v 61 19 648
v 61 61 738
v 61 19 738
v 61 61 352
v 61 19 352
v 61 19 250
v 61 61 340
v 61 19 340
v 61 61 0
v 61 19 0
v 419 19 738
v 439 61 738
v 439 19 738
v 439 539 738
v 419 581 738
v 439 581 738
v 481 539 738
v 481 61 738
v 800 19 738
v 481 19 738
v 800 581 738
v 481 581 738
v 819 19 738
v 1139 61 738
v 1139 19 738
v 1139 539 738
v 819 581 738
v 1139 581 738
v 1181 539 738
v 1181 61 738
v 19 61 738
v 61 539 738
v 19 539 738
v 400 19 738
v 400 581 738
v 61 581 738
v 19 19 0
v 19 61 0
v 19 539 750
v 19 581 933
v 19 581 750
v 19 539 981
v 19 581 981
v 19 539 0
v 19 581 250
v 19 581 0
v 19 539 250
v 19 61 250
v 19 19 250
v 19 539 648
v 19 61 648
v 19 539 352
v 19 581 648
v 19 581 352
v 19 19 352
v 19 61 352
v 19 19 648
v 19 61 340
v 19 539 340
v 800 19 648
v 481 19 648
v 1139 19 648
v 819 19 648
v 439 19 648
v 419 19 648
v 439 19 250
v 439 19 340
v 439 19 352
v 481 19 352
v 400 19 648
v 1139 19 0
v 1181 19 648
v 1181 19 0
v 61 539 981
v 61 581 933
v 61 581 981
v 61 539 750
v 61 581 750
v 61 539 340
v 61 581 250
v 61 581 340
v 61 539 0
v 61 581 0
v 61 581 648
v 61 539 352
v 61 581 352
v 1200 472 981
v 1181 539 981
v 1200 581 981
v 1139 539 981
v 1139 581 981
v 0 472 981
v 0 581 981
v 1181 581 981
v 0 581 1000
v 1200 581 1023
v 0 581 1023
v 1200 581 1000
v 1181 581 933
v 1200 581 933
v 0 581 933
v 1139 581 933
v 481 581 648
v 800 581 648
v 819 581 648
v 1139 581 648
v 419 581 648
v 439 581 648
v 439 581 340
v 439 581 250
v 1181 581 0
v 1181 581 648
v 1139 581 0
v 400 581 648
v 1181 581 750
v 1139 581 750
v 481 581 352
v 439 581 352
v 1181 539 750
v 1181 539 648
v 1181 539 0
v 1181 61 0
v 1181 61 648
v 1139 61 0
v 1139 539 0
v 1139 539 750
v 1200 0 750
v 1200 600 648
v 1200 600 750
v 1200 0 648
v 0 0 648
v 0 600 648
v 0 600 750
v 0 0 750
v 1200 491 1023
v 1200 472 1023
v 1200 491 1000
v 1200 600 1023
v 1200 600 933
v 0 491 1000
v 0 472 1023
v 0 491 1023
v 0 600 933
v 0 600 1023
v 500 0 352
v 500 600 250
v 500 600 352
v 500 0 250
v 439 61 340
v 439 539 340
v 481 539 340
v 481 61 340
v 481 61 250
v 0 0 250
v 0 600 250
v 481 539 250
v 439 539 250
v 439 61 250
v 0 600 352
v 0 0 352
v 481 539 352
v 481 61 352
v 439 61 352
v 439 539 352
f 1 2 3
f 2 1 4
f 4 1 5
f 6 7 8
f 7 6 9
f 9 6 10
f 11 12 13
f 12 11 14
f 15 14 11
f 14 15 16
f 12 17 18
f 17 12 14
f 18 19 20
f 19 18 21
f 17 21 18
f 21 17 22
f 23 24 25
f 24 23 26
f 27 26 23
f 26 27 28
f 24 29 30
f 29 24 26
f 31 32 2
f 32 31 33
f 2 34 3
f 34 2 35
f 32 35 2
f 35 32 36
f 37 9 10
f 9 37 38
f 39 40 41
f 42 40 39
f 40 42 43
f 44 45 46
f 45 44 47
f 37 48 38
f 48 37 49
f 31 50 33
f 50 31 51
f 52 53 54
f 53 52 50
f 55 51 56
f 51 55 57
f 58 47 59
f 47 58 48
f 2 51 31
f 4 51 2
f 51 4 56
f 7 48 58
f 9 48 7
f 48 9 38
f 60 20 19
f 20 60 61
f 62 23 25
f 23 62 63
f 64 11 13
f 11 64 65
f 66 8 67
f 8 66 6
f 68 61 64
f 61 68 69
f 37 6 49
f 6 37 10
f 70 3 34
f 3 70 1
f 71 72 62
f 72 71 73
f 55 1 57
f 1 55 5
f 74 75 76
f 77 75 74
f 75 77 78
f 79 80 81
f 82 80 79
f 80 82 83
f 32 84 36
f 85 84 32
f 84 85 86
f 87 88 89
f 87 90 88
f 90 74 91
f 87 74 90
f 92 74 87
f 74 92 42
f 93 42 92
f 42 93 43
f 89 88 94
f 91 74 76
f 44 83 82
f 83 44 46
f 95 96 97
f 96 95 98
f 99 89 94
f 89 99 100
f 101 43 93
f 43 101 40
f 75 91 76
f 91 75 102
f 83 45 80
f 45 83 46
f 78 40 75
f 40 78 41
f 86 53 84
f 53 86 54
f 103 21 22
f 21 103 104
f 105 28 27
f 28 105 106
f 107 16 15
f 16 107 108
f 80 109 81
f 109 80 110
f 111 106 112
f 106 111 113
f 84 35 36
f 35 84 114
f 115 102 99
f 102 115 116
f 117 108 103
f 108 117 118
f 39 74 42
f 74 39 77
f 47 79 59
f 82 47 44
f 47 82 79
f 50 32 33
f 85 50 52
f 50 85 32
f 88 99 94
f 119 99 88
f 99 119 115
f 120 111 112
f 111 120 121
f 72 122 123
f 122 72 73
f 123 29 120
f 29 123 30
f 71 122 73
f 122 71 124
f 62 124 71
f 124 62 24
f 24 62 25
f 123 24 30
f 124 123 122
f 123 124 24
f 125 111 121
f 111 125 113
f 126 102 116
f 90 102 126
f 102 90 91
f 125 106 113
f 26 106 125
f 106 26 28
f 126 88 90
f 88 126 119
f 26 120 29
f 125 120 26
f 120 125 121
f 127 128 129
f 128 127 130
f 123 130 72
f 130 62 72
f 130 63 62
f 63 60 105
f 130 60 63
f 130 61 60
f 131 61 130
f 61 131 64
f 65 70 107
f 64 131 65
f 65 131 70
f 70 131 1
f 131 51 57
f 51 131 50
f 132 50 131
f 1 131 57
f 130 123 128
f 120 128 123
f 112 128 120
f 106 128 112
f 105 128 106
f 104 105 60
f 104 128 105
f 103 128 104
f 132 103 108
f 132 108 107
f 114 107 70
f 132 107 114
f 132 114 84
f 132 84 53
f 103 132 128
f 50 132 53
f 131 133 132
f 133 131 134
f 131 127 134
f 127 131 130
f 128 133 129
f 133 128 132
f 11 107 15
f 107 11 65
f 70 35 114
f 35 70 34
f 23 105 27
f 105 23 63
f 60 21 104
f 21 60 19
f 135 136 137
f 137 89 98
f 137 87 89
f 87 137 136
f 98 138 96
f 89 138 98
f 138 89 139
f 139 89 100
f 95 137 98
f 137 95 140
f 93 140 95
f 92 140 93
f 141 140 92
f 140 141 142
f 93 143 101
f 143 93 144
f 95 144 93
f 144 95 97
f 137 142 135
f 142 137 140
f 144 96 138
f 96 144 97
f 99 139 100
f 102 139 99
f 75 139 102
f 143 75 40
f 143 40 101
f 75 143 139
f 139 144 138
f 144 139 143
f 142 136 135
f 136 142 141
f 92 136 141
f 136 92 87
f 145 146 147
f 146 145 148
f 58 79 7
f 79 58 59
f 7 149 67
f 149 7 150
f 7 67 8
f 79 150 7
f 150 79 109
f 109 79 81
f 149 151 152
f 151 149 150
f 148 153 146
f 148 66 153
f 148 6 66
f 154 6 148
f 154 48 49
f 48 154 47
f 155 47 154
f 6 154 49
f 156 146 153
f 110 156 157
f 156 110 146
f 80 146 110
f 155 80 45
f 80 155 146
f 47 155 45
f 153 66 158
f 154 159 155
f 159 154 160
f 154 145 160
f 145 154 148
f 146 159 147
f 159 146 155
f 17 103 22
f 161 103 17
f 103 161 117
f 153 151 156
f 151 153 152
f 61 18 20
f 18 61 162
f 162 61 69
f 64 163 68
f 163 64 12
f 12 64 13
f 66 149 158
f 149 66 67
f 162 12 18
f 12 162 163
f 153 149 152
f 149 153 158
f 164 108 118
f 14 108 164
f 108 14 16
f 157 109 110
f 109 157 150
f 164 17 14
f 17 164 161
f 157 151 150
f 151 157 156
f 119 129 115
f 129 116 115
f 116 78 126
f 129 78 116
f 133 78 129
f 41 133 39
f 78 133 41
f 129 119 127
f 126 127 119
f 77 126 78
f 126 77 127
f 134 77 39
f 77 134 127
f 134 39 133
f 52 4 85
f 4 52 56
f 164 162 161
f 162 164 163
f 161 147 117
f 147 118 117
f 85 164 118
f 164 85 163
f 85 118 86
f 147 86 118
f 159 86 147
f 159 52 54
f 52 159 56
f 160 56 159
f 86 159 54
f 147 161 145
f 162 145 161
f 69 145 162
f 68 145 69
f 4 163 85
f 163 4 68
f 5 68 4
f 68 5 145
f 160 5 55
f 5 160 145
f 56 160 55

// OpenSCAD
mdf = "tan";
pine = "lemonchiffon";

function x(v) = v[0];
function y(v) = v[1];
function z(v) = v[2];

function length(v) = x(v);
function width(v)  = y(v);
function height(v) = z(v);

function mdf1() = [ 1200, 600, 12 ];

function pine1() = [ 1200, 75, 30 ];
function pine2() = [ 1200, 75, 45 ];
function pine3() = [ 1200, 90, 19 ];
function pine4() = [ 1200, 42, 19 ];
function pine5() = [ 1200, 42, 42 ];

function cut(v,l) = [         l,  width(v), height(v) ];
function stand(v) = [ height(v),  width(v), length(v) ];
function spin(v)  = [  width(v), length(v), height(v) ];
function roll(v)  = [ length(v), height(v),  width(v) ];

surface_z = height(mdf1());
shelf_z = height(pine3());
clearance_z = 100;
work_z = 750;

bbox_x = length(mdf1());
bbox_y = width(mdf1());
bbox_z = work_z + 250;

function bbox000(v) = [                  0,                 0,                  0 ];
function bbox001(v) = [                  0,                 0, bbox_z - height(v) ];
function bbox010(v) = [                  0, bbox_y - width(v),                  0 ];
function bbox011(v) = [                  0, bbox_y - width(v), bbox_z - height(v) ];
function bbox100(v) = [ bbox_x - length(v),                 0,                  0 ];
function bbox101(v) = [ bbox_x - length(v),                 0, bbox_z - height(v) ];
function bbox110(v) = [ bbox_x - length(v), bbox_y - width(v),                  0 ];
function bbox111(v) = [ bbox_x - length(v), bbox_y - width(v), bbox_z - height(v) ];

module component(v, name)
{
  cube(v);
  echo(name, v);
}

function leg()   = spin(stand(cut(pine5(), work_z - surface_z)));
function bleg()  = spin(stand(cut(pine5(), bbox_z - shelf_z )));
function xbeam() = roll(cut(pine3(), bbox_x));
function ybeam() = spin(roll(cut(pine3(), bbox_y - y(xbeam())*2)));
function top()   = mdf1();
function shelf() = cut(pine3(), bbox_x);
function lip()   = roll(cut(pine4(), bbox_x));
function dtop()  = cut(mdf1(), 500);
function xdraw() = roll(cut(pine3(), 500));
function zdraw() = stand(cut(pine5(), 500 - z(top())));

function fbox000(v) = bbox000(v) + [ 0, 0, 0 ];
function fbox001(v) = bbox001(v) + [ 0, 0, -(bbox_z-work_z)-surface_z ];
function fbox010(v) = bbox010(v) + [ 0, 0, 0 ];
function fbox011(v) = bbox011(v) + [ 0, 0, -(bbox_z-work_z)-surface_z ];
function fbox100(v) = bbox100(v) + [ 0, 0, 0 ];
function fbox101(v) = bbox101(v) + [ 0, 0, -(bbox_z-work_z)-surface_z ];
function fbox110(v) = bbox110(v) + [ 0, 0, 0 ];
function fbox111(v) = bbox111(v) + [ 0, 0, -(bbox_z-work_z)-surface_z ];

color(pine)
{
  translate(fbox000(leg()))
    translate([ x(ybeam()), x(ybeam()), 0 ])
      component(leg(), "leg (front left)");

  translate(fbox010(bleg()))
    translate([ x(ybeam()), -x(ybeam()), 0 ])
      component(bleg(), "leg (back left)");

  translate(fbox100(leg()))
    translate([ -x(ybeam()), x(ybeam()), 0 ])
      component(leg(), "leg (front right)");

  translate(fbox110(bleg()))
    translate([ -x(ybeam()), -x(ybeam()), 0 ])
      component(bleg(), "leg (back right)");

  translate(fbox001(xbeam()))
    translate([ 0, 0, 0 ])
      component(xbeam(), "xbeam (front upper)");

  translate(fbox011(xbeam()))
    translate([ 0, 0, 0 ])
      component(xbeam(), "xbeam (back upper)");

  translate(fbox001(ybeam()))
    translate([ 0, x(ybeam()), 0 ])
      component(ybeam(), "ybeam");

  translate(fbox101(ybeam()))
    translate([ 0, x(ybeam()), 0 ])
      component(ybeam(), "ybeam");

  translate(fbox001(ybeam()))
    translate([ bbox_x/3, x(ybeam()), 0 ])
      component(ybeam(), "ybeam");

  translate(fbox001(ybeam()))
    translate([ bbox_x - bbox_x/3, x(ybeam()), 0 ])
      component(ybeam(), "ybeam");

  translate(bbox011(shelf()))
    translate([ 0, -y(xbeam()), 0 ])
      component(shelf(), "shelf");

  translate(bbox011(xbeam()))
    translate([ 0, 0, z(lip()) - z(shelf()) ])
      component(xbeam(), "shelf back");

  translate(bbox011(lip()))
    translate([ 0, -(y(pine3()) + z(pine3())), z(lip()) - z(shelf()) ])
      component(lip(), "shelf lip");

  translate(bbox000(xdraw()))
    translate([ 0, 0, work_z - 500 ])
      component(xdraw(), "xdraw front");

  translate(bbox010(xdraw()))
    translate([ 0, 0, work_z - 500 ])
      component(xdraw(), "xdraw back");

  translate(bbox000(ybeam()))
    translate([ 0, y(xdraw()), work_z - 500 ])
      component(ybeam(), "xdraw left");

  translate(bbox000(ybeam()))
    translate([ x(xdraw()) - x(ybeam()), y(xdraw()), work_z - 500 ])
      component(ybeam(), "xdraw right");

  translate(bbox000(zdraw()))
    translate([ 500 - x(zdraw()) - x(ybeam()), y(xdraw()), work_z - 500 ])
      component(zdraw(), "zdraw front");

  translate(bbox010(zdraw()))
    translate([ 500 - x(zdraw()) - x(ybeam()), -y(xdraw()), work_z - 500 ])
      component(zdraw(), "zdraw back");

}

color(mdf)
{
  translate(bbox001(top()))
    translate([ 0, 0, -(bbox_z - work_z) ] )
      component(top(), "surface (upper)");

  translate(bbox000(dtop()))
    translate([ 0, 0, (work_z - 500 + z(xdraw())) ] )
      component(dtop(), "surface (upper)");

}

//%cube([bbox_x, bbox_y, bbox_z]);
